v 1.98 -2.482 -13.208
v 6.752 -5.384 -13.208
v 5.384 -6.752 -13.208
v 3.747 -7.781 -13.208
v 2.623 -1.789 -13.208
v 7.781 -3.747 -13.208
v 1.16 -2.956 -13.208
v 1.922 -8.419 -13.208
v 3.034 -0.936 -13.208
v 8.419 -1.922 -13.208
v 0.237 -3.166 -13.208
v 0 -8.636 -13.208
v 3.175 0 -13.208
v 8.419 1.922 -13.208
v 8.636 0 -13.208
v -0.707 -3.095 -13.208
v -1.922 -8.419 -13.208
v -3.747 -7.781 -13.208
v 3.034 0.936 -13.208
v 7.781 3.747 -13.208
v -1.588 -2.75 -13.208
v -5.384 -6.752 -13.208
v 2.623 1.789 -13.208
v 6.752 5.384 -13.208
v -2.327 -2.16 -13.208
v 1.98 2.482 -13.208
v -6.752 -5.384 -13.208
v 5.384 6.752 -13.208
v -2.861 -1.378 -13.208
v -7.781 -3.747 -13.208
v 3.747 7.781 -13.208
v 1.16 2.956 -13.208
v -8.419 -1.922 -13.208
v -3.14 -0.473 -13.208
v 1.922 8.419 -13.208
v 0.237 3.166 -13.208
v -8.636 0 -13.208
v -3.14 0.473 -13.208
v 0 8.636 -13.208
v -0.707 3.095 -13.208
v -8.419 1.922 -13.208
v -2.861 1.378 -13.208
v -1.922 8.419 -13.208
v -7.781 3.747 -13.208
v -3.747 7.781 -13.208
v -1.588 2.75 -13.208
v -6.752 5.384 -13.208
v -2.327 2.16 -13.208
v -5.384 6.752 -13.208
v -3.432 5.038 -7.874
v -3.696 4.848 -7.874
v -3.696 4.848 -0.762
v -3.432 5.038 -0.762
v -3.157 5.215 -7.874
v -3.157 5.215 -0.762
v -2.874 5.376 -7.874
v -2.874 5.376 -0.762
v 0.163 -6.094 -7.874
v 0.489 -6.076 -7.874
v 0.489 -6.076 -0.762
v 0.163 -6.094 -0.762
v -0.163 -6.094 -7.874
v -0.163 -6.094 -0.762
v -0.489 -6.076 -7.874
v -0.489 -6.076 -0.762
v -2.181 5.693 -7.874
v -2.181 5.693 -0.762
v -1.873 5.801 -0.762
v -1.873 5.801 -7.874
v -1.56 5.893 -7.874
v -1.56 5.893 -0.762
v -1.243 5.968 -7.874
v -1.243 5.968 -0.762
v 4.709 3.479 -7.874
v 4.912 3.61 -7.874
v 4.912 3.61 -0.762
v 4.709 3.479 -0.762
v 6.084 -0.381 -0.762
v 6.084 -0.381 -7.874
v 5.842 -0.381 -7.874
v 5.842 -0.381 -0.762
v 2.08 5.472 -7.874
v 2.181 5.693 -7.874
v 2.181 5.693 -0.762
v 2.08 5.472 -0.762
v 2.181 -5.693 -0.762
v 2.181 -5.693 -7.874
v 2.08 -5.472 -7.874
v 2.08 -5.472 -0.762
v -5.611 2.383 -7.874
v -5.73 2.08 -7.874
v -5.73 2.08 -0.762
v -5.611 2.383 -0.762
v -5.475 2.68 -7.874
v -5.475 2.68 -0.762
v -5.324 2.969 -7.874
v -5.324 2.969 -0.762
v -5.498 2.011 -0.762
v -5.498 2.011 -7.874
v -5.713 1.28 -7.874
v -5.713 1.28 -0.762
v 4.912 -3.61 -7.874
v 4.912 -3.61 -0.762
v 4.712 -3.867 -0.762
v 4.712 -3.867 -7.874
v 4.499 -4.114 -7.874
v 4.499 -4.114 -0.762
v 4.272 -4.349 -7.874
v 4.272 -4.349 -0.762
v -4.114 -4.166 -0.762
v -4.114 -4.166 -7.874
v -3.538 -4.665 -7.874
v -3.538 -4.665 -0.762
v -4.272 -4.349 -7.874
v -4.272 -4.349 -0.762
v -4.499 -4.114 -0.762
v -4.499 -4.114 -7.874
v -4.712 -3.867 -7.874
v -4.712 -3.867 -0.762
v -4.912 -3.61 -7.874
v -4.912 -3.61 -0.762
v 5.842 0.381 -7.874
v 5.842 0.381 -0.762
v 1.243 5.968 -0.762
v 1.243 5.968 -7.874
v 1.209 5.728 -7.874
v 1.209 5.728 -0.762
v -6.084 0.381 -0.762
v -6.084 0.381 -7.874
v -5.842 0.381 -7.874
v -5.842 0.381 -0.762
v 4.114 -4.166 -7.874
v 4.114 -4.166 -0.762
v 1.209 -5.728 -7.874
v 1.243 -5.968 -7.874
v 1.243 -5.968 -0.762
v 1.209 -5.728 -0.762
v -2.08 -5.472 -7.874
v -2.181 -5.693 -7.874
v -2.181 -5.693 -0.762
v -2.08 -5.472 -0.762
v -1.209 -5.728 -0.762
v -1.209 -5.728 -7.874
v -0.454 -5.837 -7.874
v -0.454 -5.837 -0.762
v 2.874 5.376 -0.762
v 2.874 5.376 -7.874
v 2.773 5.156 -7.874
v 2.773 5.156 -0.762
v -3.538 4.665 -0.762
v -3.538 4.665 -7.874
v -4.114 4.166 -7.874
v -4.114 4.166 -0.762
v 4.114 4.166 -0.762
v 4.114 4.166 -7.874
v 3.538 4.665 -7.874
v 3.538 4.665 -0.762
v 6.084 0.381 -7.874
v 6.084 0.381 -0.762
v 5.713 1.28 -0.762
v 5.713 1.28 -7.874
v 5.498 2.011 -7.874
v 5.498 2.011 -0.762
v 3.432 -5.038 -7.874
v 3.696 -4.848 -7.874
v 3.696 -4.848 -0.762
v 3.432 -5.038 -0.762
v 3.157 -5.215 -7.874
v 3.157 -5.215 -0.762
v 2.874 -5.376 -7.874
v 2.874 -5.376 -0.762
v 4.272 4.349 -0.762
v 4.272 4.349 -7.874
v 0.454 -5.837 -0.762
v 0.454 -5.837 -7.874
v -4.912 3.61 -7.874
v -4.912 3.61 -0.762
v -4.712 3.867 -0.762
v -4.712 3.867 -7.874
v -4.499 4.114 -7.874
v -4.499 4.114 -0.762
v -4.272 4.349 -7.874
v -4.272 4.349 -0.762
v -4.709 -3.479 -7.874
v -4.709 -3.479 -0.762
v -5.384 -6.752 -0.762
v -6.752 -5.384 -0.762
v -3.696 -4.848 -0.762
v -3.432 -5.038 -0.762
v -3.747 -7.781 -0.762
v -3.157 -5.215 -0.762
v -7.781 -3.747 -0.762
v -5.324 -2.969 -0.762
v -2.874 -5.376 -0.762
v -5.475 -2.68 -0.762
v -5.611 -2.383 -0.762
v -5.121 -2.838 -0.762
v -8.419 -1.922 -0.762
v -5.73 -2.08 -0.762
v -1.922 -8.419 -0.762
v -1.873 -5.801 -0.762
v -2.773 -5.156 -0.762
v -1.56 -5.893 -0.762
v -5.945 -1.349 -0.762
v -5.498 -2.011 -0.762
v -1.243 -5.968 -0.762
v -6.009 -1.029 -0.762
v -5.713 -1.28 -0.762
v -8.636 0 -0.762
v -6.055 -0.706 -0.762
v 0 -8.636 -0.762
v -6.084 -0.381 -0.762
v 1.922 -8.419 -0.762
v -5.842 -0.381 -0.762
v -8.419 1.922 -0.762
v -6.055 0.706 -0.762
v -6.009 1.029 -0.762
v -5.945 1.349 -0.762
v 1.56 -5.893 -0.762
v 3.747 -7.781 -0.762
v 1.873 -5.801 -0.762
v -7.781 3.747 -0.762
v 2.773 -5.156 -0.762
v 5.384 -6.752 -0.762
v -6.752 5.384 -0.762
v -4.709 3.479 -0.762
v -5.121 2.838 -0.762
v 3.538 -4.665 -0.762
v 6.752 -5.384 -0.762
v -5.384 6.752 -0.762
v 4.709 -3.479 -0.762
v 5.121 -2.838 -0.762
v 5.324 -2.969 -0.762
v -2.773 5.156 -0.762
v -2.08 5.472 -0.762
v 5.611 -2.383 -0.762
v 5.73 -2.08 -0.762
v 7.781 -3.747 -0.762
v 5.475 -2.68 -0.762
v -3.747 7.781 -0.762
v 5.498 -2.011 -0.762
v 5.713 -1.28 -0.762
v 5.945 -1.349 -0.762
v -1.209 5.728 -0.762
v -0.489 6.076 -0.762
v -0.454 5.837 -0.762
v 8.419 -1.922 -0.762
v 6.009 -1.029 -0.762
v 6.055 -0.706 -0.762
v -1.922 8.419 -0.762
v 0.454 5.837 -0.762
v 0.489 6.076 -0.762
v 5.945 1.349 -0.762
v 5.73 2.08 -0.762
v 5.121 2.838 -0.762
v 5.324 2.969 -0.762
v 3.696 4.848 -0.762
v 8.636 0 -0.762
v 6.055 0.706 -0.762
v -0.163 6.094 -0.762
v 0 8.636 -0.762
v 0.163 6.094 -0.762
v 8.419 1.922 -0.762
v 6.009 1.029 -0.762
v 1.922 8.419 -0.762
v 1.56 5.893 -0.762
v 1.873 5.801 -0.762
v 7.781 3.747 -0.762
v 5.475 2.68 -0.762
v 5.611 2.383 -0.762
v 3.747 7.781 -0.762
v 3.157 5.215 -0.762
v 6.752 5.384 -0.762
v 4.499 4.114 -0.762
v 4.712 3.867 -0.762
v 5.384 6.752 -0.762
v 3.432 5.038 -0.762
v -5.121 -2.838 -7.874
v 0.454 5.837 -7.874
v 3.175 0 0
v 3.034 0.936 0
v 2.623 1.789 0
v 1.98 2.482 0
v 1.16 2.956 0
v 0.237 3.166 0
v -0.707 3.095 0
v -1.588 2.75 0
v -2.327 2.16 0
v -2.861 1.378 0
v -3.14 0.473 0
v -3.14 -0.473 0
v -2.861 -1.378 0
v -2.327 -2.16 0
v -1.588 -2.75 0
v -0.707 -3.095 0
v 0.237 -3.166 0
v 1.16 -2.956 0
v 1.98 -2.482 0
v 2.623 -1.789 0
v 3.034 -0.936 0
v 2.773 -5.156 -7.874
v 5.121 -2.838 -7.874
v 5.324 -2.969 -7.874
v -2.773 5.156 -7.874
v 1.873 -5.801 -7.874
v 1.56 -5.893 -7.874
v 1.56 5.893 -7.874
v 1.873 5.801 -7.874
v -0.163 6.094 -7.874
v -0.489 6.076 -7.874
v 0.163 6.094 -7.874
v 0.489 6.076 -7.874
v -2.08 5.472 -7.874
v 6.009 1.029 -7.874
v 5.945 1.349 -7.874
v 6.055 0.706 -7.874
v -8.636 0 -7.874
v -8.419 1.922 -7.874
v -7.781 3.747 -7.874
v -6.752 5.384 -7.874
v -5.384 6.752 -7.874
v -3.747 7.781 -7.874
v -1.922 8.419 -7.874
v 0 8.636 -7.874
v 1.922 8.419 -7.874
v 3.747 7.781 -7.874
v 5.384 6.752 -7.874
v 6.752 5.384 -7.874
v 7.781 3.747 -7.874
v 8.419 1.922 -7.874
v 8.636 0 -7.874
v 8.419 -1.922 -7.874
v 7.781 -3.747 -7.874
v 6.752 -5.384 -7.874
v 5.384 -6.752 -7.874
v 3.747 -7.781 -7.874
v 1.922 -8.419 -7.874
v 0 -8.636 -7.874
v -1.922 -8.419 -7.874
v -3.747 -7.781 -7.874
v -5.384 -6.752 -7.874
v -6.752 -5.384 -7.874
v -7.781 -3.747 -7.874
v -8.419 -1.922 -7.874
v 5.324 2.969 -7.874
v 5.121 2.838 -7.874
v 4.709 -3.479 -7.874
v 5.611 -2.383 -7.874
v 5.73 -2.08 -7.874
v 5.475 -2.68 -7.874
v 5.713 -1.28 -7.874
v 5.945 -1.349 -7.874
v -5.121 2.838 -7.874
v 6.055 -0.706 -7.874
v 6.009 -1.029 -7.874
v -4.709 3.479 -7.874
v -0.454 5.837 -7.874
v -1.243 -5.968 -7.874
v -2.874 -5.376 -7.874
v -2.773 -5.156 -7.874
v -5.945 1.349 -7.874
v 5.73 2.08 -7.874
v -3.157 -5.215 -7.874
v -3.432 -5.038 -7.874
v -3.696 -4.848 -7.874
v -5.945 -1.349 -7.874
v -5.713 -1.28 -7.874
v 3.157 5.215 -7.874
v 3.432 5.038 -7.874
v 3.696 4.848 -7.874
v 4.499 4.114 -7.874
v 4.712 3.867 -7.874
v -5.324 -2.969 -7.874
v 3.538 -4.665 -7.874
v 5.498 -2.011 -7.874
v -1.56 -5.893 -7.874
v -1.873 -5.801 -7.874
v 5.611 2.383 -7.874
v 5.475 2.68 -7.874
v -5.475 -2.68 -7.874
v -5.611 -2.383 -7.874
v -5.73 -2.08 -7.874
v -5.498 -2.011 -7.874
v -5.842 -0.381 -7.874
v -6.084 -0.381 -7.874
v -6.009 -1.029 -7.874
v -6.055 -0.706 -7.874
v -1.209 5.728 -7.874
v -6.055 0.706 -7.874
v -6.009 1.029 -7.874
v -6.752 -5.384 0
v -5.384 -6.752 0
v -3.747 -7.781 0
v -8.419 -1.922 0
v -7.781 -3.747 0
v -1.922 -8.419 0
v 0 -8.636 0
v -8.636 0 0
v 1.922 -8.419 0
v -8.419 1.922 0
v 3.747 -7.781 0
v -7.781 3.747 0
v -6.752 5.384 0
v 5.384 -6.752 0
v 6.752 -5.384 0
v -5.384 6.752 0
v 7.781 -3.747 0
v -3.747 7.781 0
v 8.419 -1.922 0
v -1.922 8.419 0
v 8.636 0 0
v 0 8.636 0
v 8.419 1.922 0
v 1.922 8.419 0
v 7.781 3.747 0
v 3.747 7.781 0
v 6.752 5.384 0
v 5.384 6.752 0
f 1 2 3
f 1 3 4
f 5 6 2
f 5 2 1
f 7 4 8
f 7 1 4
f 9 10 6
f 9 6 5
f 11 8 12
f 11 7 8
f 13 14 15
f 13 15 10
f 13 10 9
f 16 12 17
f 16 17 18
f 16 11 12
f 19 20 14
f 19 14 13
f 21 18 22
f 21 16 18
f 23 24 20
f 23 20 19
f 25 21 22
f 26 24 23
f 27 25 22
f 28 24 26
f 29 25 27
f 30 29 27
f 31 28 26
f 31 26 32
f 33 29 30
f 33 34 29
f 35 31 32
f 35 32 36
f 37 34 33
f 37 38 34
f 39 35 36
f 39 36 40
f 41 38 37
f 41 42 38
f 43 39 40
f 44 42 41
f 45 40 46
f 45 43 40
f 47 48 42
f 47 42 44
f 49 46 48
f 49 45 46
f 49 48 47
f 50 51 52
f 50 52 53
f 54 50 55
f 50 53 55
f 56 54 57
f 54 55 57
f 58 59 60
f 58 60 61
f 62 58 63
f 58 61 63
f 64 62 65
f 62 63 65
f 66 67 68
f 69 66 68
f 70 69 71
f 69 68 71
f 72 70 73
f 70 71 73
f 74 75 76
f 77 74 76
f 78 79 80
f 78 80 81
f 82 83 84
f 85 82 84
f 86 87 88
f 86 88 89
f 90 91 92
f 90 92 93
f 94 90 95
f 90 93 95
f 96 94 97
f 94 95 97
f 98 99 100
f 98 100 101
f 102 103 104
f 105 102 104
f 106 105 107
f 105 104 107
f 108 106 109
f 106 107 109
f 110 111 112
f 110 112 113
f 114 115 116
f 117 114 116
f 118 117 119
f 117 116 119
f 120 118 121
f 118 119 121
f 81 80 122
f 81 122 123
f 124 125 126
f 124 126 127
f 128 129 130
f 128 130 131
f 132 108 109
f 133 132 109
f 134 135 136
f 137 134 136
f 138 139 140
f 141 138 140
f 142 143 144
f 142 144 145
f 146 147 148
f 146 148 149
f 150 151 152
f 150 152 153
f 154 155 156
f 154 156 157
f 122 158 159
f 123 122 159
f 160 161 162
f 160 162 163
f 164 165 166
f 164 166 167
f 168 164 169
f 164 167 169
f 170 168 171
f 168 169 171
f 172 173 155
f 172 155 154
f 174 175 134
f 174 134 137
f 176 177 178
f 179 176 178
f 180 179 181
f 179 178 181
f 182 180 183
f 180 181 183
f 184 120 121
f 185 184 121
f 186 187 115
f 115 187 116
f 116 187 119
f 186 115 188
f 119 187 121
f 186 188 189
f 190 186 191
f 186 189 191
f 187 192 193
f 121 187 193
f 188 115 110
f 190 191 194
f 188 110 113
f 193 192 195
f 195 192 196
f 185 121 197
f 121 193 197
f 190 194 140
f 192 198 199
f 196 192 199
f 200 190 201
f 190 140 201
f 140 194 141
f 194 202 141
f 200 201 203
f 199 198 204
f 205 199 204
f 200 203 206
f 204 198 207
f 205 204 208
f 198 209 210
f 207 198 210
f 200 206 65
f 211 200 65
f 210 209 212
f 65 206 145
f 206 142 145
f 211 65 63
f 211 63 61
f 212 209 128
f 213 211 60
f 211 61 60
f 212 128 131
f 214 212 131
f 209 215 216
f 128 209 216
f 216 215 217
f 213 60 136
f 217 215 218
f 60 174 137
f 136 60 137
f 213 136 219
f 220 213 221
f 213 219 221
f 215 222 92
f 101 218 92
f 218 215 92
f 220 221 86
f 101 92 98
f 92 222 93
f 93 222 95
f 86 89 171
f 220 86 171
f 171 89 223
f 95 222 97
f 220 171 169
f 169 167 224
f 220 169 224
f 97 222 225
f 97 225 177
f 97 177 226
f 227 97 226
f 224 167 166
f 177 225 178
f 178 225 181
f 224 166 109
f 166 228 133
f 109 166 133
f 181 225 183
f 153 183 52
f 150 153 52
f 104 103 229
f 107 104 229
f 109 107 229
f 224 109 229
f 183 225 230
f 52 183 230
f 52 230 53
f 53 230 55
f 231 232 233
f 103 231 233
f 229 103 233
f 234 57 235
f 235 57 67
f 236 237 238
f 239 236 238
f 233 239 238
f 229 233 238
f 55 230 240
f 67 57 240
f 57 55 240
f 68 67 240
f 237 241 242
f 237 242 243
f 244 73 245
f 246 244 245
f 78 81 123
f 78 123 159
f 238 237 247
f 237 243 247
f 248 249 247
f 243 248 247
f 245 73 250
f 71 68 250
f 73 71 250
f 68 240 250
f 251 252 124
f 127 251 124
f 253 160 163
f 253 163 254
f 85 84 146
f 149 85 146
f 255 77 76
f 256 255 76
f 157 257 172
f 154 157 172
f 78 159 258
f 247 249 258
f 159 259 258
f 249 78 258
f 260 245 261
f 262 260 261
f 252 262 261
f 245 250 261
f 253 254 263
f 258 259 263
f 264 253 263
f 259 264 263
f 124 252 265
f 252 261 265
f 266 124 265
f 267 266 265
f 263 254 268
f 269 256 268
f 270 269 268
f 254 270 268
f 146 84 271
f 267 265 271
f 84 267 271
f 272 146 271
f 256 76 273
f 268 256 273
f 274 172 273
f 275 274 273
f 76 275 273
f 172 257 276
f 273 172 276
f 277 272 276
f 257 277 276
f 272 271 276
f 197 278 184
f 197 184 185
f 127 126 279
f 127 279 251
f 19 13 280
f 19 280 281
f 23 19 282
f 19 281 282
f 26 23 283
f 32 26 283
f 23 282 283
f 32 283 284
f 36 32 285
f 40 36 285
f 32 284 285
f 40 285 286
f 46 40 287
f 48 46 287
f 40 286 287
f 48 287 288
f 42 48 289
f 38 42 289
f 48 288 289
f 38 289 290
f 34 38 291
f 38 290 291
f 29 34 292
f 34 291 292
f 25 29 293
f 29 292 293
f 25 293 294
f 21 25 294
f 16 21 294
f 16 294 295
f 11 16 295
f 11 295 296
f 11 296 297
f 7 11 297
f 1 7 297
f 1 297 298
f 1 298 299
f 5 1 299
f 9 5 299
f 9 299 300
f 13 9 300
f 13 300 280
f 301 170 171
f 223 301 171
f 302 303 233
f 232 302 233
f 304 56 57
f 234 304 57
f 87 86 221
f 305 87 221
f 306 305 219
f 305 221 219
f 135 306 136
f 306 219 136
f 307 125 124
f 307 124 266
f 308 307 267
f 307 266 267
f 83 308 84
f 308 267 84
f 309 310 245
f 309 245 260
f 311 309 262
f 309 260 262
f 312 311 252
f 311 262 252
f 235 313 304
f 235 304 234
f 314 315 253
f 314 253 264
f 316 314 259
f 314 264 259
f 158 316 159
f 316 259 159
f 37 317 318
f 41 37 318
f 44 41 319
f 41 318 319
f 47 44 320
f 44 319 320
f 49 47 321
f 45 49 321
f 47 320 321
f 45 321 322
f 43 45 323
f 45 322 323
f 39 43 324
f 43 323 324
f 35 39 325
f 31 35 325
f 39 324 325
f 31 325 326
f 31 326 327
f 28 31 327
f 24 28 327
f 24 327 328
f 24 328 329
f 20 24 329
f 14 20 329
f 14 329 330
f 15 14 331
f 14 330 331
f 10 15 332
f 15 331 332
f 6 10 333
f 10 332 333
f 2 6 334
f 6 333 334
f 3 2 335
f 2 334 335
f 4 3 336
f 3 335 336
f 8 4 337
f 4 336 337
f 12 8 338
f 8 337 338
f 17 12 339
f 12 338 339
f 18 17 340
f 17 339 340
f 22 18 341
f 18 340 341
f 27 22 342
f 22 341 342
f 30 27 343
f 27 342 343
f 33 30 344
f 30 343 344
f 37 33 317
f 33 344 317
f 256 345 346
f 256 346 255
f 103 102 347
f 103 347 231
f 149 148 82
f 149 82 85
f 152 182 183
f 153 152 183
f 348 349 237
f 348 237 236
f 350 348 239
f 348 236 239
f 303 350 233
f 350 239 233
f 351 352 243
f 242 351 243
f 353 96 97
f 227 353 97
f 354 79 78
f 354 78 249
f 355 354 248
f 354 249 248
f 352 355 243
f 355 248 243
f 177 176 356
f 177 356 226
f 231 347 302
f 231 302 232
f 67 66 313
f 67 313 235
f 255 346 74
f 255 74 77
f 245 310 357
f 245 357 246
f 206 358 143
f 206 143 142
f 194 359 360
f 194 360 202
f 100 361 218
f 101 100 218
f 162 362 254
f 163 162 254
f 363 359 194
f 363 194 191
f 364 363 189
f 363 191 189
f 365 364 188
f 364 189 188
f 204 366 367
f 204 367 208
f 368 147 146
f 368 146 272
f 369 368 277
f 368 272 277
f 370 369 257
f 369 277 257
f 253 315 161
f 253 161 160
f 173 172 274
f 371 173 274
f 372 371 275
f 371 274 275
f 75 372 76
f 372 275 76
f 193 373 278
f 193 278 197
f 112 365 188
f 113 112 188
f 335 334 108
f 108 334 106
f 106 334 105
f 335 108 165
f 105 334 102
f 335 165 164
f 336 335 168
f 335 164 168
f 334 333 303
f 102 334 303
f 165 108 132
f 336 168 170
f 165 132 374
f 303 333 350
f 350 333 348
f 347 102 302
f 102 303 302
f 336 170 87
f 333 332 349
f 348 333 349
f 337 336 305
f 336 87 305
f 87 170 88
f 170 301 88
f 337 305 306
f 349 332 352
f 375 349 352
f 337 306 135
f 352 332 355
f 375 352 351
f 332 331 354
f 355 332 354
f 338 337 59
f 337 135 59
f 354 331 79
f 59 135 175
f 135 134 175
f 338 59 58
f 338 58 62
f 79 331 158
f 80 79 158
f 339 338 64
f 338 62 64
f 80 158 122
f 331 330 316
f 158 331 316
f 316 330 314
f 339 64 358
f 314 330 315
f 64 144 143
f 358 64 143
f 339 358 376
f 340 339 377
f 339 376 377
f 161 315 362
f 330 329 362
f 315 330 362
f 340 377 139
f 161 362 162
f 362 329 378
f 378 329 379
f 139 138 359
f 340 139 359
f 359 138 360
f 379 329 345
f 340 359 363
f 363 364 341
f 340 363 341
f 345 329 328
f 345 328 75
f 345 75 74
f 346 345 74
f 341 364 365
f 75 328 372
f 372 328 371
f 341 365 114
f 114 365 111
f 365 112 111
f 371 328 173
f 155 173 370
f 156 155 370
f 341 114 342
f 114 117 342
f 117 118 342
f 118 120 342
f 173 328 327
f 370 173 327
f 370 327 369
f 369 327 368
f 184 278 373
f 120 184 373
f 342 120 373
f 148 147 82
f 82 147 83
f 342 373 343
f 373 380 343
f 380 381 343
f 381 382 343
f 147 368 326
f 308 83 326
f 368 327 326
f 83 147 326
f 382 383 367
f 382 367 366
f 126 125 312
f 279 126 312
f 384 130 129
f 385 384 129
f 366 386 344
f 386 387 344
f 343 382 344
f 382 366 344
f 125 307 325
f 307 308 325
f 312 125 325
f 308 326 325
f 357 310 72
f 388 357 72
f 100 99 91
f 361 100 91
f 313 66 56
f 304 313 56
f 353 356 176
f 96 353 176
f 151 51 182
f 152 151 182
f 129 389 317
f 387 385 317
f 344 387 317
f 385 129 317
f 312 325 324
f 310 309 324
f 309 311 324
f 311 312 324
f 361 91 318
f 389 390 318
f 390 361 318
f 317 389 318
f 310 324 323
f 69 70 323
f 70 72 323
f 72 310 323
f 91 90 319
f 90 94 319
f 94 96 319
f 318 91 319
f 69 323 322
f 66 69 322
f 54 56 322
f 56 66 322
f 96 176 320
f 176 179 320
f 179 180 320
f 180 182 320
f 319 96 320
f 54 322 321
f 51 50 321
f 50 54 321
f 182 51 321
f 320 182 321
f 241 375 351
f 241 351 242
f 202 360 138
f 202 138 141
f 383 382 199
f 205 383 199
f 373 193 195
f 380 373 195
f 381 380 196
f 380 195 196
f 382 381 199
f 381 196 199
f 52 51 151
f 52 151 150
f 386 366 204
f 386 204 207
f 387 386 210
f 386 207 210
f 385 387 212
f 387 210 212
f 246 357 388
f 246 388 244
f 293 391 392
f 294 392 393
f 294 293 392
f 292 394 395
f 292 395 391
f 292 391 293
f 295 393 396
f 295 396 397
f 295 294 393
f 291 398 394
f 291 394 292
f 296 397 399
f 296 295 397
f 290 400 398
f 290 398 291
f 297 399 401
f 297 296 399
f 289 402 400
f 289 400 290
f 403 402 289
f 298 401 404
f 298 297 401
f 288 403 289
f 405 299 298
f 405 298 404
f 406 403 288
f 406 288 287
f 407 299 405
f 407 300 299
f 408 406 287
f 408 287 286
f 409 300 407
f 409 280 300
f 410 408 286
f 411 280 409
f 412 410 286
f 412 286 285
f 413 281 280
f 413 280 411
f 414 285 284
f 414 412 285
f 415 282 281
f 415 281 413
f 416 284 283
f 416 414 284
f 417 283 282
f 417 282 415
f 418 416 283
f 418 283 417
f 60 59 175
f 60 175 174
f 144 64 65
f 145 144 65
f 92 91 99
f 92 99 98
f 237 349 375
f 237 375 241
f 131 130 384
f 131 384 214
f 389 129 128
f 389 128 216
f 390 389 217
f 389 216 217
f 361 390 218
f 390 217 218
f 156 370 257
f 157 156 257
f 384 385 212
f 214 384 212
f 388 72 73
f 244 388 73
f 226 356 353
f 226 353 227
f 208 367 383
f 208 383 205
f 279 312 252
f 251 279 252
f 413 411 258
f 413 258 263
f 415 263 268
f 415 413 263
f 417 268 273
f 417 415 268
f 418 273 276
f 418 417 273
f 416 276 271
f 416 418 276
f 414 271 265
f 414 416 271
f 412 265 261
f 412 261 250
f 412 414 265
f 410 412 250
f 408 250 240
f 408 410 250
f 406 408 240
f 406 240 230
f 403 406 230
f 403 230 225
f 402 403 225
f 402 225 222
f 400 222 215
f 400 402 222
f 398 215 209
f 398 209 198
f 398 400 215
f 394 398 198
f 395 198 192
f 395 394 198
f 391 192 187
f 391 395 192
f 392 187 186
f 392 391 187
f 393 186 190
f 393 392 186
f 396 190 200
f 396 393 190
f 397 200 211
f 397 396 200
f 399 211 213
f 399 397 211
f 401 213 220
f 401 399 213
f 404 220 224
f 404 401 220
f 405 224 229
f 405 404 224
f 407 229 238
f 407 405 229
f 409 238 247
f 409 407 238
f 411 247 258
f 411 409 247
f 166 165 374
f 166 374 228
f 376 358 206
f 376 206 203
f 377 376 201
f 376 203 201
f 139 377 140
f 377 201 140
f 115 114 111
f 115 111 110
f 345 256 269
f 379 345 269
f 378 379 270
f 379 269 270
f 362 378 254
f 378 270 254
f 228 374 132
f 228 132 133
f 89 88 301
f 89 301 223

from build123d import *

# Parameters (mm, degrees)
SKETCH1_R           = 8.636
BOSS_EXTRUDE1_DEPTH = 0.762
SKETCH2_R           = 6.096
BOSS_EXTRUDE2_DEPTH = 7.112
SKETCH3_R           = 8.636
BOSS_EXTRUDE3_DEPTH = 5.334
SKETCH4_R           = 3.175
CUT_EXTRUDE1_DEPTH  = 25.654
SKETCH5_W           = 7.112
SKETCH5_H           = 0.762
CUT_EXTRUDE2_DEPTH  = 0.254
CIRPATTERN1_COUNT   = 22


with BuildPart() as part:
    # Sketch1 → Boss-Extrude1 (new body)
    with BuildSketch(Plane.XY):
        Circle(SKETCH1_R)
    extrude(amount=-BOSS_EXTRUDE1_DEPTH)

    # Sketch2 → Boss-Extrude2 (add)
    with BuildSketch(Plane(origin=(0, 0, -0.762), x_dir=(-1, 0, 0), z_dir=(0, 0, -1))):
        Circle(SKETCH2_R)
    extrude(amount=BOSS_EXTRUDE2_DEPTH)

    # Sketch3 → Boss-Extrude3 (add)
    with BuildSketch(Plane(origin=(0, 0, -7.874), x_dir=(-1, 0, 0), z_dir=(0, 0, -1))):
        Circle(SKETCH3_R)
    extrude(amount=BOSS_EXTRUDE3_DEPTH)

    # Sketch4 → Cut-Extrude1 (cut)
    with BuildSketch(Plane.XY):
        Circle(SKETCH4_R)
    extrude(amount=-CUT_EXTRUDE1_DEPTH, mode=Mode.SUBTRACT)

    # Sketch5 → Cut-Extrude2 (cut)
    with BuildSketch(Plane.ZY.offset(6.096)):
        with Locations((-4.318, 0)):
            Rectangle(SKETCH5_W, SKETCH5_H)
    cut_extrude2 = extrude(amount=-CUT_EXTRUDE2_DEPTH, mode=Mode.SUBTRACT)

    # CirPattern1: Cut-Extrude2 ×22 about axis
    cirpattern1_axis = Axis((0, 0, -13.208), (0, 0, 1))
    for i in range(1, CIRPATTERN1_COUNT):
        add(cut_extrude2.rotate(cirpattern1_axis, i * 360 / CIRPATTERN1_COUNT), mode=Mode.SUBTRACT)


solid = part.part
